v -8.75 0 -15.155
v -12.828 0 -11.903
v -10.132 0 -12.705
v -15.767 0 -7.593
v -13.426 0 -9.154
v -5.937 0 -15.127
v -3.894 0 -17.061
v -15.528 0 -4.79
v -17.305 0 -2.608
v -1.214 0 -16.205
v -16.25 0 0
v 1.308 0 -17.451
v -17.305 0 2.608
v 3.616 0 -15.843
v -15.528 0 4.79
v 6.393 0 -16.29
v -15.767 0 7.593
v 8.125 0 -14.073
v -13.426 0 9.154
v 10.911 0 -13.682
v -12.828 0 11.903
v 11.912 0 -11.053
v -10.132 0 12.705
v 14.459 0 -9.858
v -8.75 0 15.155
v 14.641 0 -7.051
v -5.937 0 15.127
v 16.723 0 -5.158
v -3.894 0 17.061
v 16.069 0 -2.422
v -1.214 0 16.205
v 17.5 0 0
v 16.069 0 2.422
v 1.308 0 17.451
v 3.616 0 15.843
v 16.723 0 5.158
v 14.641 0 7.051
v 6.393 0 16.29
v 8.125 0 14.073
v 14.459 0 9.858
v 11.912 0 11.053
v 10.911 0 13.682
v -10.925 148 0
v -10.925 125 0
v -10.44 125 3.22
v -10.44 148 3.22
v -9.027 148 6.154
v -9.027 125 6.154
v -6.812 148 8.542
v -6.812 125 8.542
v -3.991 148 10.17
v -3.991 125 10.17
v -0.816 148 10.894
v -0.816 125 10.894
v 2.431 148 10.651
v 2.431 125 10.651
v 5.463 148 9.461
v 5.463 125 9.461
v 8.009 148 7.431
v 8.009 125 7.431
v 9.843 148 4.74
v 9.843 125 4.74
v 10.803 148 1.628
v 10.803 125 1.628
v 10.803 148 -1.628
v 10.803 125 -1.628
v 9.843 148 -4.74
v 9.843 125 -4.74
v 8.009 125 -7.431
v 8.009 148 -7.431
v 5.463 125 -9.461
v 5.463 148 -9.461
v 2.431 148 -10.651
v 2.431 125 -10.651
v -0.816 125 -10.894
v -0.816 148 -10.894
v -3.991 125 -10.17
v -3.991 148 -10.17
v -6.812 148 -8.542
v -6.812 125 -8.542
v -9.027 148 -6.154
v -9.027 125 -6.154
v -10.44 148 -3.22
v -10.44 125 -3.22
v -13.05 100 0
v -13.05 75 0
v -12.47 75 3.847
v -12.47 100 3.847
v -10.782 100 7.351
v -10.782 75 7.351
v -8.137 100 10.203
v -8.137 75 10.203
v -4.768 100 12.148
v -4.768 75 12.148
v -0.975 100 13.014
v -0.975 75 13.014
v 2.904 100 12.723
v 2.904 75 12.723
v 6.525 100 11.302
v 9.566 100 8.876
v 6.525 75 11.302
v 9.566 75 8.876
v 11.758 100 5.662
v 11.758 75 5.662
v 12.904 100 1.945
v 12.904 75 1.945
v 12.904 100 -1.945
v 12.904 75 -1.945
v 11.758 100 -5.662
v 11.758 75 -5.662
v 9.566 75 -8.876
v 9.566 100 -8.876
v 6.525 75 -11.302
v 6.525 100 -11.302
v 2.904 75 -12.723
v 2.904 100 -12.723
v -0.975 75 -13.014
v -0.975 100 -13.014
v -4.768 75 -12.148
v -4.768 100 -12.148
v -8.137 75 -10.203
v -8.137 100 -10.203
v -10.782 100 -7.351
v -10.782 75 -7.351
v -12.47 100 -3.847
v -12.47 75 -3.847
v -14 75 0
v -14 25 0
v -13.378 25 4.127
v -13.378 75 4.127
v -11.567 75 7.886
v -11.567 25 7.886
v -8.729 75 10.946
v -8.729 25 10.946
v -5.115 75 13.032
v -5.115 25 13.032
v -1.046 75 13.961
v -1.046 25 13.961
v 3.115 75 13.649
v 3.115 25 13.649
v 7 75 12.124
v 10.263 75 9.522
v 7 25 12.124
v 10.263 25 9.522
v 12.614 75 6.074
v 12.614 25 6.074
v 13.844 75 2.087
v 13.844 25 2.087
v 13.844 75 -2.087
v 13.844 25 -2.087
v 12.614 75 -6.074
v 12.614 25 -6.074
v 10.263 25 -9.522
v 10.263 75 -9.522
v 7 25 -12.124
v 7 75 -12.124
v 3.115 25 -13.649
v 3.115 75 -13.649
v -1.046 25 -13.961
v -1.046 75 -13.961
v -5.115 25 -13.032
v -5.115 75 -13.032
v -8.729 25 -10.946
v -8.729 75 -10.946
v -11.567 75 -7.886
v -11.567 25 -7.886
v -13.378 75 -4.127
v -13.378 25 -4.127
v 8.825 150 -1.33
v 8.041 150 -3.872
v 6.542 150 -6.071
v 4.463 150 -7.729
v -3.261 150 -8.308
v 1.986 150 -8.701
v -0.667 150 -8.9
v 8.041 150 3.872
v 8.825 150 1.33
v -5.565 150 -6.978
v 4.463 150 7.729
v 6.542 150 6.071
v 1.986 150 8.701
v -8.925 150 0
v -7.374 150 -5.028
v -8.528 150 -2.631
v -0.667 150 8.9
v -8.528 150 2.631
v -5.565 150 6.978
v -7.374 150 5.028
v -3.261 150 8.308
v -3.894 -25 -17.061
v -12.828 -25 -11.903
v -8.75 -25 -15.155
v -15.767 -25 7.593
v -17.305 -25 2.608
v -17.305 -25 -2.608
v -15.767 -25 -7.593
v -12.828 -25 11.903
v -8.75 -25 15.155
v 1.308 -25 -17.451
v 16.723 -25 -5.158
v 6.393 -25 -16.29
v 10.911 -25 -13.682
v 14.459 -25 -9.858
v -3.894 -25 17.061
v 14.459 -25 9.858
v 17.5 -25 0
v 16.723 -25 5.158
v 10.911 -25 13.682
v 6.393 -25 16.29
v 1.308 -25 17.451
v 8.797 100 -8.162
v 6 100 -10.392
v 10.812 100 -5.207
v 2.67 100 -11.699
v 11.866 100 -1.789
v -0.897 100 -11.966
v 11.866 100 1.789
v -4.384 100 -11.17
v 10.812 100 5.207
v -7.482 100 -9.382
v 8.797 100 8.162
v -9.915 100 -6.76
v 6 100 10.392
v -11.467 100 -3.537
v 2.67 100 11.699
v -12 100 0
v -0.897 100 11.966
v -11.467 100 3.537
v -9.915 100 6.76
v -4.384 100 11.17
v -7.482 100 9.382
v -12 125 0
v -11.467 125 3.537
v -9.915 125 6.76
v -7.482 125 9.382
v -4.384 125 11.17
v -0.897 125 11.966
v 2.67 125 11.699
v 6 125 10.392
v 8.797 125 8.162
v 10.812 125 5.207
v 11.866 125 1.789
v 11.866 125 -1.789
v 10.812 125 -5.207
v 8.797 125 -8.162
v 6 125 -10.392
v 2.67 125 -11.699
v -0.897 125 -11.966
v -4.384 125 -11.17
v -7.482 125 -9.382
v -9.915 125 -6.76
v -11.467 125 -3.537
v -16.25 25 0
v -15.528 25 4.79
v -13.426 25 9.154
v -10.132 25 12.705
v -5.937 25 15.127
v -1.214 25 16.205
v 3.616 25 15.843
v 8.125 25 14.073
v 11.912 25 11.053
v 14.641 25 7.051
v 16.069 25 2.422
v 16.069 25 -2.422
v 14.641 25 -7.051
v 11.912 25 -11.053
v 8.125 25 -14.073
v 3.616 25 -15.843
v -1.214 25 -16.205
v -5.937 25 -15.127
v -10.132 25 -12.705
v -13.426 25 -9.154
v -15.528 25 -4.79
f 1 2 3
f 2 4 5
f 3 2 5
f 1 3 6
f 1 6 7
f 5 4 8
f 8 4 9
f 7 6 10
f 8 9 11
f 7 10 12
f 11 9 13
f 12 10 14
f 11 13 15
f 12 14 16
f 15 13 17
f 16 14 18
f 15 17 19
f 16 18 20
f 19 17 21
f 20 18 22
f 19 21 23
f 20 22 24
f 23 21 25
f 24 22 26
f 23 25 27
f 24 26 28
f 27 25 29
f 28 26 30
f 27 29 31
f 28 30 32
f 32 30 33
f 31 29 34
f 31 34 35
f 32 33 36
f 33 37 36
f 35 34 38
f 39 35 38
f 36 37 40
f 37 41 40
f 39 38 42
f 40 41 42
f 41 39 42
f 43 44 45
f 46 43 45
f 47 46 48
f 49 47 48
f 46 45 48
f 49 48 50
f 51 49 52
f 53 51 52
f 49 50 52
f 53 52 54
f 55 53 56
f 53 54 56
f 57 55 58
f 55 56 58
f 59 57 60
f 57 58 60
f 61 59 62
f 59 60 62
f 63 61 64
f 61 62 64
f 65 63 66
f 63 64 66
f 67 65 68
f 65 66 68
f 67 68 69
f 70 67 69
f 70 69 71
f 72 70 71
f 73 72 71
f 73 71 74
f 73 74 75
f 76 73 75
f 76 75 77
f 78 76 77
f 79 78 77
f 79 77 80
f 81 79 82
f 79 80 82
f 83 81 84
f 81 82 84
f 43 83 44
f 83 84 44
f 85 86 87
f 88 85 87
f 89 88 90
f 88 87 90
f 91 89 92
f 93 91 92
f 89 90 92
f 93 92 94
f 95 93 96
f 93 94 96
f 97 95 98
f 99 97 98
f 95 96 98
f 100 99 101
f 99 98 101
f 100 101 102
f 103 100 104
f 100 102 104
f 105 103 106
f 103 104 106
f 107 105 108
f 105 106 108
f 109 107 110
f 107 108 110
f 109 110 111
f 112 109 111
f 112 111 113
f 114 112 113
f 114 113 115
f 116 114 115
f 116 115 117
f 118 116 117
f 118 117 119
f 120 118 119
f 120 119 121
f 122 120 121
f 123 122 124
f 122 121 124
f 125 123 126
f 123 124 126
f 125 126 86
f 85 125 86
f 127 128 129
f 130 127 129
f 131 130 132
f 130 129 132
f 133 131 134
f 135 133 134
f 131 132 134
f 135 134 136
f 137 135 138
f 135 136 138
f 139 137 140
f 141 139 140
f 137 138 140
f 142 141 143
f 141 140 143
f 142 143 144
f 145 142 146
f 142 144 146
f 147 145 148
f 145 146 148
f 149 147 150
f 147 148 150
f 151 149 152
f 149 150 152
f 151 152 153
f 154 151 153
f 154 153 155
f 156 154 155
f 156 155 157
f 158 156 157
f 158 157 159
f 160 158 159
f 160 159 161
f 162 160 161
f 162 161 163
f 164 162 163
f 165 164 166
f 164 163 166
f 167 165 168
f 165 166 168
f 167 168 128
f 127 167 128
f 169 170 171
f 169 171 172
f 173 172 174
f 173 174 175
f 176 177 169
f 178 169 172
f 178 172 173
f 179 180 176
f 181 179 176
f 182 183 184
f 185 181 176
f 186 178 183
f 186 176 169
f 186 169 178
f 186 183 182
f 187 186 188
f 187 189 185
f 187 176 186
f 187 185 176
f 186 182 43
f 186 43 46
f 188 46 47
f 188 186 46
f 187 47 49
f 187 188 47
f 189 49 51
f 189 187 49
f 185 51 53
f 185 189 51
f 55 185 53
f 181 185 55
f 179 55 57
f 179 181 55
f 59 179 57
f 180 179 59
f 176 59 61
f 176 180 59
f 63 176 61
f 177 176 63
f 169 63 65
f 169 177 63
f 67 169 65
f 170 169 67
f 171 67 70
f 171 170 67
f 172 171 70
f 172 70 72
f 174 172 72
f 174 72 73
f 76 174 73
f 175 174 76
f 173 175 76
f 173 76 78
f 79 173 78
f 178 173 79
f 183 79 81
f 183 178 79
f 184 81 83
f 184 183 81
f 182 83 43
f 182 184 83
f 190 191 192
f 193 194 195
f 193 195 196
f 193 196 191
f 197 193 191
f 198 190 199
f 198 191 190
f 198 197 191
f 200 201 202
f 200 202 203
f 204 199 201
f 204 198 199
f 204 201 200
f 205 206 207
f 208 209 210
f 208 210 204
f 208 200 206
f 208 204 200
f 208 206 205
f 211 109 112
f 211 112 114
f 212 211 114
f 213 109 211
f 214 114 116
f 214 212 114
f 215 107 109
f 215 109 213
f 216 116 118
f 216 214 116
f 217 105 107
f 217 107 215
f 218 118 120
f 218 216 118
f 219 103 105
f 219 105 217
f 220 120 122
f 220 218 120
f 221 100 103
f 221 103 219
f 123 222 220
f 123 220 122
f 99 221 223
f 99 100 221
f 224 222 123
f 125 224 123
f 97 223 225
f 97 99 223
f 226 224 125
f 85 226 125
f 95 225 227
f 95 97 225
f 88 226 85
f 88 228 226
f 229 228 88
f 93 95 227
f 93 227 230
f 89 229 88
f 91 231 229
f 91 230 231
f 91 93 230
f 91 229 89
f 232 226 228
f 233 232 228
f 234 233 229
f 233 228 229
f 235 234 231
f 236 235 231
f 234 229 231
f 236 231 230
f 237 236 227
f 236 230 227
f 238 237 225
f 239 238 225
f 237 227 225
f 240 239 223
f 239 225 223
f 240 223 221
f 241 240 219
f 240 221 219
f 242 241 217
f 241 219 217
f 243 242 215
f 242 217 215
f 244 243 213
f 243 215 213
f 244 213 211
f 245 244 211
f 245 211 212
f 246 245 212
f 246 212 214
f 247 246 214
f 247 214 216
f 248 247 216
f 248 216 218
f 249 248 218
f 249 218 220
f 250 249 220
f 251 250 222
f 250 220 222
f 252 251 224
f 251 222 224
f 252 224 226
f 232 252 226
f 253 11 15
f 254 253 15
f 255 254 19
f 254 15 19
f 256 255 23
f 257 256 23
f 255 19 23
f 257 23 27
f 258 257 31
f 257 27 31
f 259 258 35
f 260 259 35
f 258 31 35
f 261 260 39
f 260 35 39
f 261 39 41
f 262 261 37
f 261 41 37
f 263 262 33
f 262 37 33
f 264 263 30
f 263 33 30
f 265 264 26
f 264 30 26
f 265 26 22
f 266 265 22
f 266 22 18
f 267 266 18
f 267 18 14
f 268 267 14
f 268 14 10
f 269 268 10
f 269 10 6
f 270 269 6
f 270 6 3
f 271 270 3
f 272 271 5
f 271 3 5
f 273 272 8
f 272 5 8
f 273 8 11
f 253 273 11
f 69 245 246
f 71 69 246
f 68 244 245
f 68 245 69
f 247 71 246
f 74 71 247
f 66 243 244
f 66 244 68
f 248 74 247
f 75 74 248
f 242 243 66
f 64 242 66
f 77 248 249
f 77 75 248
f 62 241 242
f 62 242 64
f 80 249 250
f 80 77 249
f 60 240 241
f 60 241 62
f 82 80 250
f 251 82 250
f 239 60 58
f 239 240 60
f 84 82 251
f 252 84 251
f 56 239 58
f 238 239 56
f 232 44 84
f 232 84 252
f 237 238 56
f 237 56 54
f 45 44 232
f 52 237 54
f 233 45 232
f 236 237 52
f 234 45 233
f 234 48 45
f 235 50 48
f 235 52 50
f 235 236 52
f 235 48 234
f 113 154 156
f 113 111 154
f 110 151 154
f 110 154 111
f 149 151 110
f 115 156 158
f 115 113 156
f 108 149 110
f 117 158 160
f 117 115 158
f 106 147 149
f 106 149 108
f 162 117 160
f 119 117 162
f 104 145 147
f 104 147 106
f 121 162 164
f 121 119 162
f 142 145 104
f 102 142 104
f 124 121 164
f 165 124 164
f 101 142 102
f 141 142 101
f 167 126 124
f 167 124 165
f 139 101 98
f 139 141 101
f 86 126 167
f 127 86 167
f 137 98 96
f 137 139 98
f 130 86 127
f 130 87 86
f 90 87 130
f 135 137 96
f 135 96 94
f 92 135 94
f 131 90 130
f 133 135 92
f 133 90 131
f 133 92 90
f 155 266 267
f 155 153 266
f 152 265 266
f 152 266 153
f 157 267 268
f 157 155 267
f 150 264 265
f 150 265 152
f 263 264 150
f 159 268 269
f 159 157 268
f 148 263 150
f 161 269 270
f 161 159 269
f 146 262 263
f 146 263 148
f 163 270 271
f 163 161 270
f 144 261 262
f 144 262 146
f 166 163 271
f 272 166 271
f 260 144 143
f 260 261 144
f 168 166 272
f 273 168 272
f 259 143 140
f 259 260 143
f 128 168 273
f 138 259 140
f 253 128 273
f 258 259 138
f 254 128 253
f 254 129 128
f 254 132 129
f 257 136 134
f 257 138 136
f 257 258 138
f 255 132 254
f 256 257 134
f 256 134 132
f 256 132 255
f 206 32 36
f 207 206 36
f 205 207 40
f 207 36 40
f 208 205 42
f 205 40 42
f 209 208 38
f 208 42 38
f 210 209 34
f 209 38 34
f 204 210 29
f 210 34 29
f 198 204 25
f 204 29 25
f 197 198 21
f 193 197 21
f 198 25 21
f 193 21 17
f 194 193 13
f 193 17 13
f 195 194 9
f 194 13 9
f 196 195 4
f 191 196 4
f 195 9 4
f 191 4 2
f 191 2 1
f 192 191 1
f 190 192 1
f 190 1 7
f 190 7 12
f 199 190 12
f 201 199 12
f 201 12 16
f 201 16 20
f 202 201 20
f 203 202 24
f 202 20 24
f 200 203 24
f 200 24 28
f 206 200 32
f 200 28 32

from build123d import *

# Parameters (mm, degrees)
F0_R      = 17.5
F1_DEPTH  = 25
F2_R      = 16.25
F3_DEPTH  = 25
F4_R      = 14
F5_DEPTH  = 50
F6_R      = 13.05
F7_DEPTH  = 25
F8_R      = 12
F9_DEPTH  = 25
F10_R     = 10.925
F11_DEPTH = 25
F12_SIZE  = 2


with BuildPart() as f1:
    # F0 (on Front) → F1 (new body)
    with BuildSketch(Plane.XZ):
        Circle(F0_R)
    extrude(amount=F1_DEPTH)

    # F2 (on face) → F3 (join)
    with BuildSketch(Plane(origin=(0, 0, 0), x_dir=(-1, 0, 0), z_dir=(0, 1, 0))):
        Circle(F2_R)
    extrude(amount=F3_DEPTH)

    # F4 (on face) → F5 (join)
    with BuildSketch(Plane(origin=(0, 25, 0), x_dir=(-1, 0, 0), z_dir=(0, 1, 0))):
        Circle(F4_R)
    extrude(amount=F5_DEPTH)

    # F6 (on face) → F7 (join)
    with BuildSketch(Plane(origin=(0, 75, 0), x_dir=(-1, 0, 0), z_dir=(0, 1, 0))):
        Circle(F6_R)
    extrude(amount=F7_DEPTH)

    # F8 (on face) → F9 (join)
    with BuildSketch(Plane(origin=(0, 100, 0), x_dir=(-1, 0, 0), z_dir=(0, 1, 0))):
        Circle(F8_R)
    extrude(amount=F9_DEPTH)

    # F10 (on face) → F11 (join)
    with BuildSketch(Plane(origin=(0, 125, 0), x_dir=(-1, 0, 0), z_dir=(0, 1, 0))):
        Circle(F10_R)
    extrude(amount=F11_DEPTH)

    # F12
    f12_edges = [f1.edges().sort_by_distance(p)[0] for p in [
        (10.925, 150, 0),
    ]]
    chamfer(f12_edges, length=F12_SIZE)


solid = f1.part
